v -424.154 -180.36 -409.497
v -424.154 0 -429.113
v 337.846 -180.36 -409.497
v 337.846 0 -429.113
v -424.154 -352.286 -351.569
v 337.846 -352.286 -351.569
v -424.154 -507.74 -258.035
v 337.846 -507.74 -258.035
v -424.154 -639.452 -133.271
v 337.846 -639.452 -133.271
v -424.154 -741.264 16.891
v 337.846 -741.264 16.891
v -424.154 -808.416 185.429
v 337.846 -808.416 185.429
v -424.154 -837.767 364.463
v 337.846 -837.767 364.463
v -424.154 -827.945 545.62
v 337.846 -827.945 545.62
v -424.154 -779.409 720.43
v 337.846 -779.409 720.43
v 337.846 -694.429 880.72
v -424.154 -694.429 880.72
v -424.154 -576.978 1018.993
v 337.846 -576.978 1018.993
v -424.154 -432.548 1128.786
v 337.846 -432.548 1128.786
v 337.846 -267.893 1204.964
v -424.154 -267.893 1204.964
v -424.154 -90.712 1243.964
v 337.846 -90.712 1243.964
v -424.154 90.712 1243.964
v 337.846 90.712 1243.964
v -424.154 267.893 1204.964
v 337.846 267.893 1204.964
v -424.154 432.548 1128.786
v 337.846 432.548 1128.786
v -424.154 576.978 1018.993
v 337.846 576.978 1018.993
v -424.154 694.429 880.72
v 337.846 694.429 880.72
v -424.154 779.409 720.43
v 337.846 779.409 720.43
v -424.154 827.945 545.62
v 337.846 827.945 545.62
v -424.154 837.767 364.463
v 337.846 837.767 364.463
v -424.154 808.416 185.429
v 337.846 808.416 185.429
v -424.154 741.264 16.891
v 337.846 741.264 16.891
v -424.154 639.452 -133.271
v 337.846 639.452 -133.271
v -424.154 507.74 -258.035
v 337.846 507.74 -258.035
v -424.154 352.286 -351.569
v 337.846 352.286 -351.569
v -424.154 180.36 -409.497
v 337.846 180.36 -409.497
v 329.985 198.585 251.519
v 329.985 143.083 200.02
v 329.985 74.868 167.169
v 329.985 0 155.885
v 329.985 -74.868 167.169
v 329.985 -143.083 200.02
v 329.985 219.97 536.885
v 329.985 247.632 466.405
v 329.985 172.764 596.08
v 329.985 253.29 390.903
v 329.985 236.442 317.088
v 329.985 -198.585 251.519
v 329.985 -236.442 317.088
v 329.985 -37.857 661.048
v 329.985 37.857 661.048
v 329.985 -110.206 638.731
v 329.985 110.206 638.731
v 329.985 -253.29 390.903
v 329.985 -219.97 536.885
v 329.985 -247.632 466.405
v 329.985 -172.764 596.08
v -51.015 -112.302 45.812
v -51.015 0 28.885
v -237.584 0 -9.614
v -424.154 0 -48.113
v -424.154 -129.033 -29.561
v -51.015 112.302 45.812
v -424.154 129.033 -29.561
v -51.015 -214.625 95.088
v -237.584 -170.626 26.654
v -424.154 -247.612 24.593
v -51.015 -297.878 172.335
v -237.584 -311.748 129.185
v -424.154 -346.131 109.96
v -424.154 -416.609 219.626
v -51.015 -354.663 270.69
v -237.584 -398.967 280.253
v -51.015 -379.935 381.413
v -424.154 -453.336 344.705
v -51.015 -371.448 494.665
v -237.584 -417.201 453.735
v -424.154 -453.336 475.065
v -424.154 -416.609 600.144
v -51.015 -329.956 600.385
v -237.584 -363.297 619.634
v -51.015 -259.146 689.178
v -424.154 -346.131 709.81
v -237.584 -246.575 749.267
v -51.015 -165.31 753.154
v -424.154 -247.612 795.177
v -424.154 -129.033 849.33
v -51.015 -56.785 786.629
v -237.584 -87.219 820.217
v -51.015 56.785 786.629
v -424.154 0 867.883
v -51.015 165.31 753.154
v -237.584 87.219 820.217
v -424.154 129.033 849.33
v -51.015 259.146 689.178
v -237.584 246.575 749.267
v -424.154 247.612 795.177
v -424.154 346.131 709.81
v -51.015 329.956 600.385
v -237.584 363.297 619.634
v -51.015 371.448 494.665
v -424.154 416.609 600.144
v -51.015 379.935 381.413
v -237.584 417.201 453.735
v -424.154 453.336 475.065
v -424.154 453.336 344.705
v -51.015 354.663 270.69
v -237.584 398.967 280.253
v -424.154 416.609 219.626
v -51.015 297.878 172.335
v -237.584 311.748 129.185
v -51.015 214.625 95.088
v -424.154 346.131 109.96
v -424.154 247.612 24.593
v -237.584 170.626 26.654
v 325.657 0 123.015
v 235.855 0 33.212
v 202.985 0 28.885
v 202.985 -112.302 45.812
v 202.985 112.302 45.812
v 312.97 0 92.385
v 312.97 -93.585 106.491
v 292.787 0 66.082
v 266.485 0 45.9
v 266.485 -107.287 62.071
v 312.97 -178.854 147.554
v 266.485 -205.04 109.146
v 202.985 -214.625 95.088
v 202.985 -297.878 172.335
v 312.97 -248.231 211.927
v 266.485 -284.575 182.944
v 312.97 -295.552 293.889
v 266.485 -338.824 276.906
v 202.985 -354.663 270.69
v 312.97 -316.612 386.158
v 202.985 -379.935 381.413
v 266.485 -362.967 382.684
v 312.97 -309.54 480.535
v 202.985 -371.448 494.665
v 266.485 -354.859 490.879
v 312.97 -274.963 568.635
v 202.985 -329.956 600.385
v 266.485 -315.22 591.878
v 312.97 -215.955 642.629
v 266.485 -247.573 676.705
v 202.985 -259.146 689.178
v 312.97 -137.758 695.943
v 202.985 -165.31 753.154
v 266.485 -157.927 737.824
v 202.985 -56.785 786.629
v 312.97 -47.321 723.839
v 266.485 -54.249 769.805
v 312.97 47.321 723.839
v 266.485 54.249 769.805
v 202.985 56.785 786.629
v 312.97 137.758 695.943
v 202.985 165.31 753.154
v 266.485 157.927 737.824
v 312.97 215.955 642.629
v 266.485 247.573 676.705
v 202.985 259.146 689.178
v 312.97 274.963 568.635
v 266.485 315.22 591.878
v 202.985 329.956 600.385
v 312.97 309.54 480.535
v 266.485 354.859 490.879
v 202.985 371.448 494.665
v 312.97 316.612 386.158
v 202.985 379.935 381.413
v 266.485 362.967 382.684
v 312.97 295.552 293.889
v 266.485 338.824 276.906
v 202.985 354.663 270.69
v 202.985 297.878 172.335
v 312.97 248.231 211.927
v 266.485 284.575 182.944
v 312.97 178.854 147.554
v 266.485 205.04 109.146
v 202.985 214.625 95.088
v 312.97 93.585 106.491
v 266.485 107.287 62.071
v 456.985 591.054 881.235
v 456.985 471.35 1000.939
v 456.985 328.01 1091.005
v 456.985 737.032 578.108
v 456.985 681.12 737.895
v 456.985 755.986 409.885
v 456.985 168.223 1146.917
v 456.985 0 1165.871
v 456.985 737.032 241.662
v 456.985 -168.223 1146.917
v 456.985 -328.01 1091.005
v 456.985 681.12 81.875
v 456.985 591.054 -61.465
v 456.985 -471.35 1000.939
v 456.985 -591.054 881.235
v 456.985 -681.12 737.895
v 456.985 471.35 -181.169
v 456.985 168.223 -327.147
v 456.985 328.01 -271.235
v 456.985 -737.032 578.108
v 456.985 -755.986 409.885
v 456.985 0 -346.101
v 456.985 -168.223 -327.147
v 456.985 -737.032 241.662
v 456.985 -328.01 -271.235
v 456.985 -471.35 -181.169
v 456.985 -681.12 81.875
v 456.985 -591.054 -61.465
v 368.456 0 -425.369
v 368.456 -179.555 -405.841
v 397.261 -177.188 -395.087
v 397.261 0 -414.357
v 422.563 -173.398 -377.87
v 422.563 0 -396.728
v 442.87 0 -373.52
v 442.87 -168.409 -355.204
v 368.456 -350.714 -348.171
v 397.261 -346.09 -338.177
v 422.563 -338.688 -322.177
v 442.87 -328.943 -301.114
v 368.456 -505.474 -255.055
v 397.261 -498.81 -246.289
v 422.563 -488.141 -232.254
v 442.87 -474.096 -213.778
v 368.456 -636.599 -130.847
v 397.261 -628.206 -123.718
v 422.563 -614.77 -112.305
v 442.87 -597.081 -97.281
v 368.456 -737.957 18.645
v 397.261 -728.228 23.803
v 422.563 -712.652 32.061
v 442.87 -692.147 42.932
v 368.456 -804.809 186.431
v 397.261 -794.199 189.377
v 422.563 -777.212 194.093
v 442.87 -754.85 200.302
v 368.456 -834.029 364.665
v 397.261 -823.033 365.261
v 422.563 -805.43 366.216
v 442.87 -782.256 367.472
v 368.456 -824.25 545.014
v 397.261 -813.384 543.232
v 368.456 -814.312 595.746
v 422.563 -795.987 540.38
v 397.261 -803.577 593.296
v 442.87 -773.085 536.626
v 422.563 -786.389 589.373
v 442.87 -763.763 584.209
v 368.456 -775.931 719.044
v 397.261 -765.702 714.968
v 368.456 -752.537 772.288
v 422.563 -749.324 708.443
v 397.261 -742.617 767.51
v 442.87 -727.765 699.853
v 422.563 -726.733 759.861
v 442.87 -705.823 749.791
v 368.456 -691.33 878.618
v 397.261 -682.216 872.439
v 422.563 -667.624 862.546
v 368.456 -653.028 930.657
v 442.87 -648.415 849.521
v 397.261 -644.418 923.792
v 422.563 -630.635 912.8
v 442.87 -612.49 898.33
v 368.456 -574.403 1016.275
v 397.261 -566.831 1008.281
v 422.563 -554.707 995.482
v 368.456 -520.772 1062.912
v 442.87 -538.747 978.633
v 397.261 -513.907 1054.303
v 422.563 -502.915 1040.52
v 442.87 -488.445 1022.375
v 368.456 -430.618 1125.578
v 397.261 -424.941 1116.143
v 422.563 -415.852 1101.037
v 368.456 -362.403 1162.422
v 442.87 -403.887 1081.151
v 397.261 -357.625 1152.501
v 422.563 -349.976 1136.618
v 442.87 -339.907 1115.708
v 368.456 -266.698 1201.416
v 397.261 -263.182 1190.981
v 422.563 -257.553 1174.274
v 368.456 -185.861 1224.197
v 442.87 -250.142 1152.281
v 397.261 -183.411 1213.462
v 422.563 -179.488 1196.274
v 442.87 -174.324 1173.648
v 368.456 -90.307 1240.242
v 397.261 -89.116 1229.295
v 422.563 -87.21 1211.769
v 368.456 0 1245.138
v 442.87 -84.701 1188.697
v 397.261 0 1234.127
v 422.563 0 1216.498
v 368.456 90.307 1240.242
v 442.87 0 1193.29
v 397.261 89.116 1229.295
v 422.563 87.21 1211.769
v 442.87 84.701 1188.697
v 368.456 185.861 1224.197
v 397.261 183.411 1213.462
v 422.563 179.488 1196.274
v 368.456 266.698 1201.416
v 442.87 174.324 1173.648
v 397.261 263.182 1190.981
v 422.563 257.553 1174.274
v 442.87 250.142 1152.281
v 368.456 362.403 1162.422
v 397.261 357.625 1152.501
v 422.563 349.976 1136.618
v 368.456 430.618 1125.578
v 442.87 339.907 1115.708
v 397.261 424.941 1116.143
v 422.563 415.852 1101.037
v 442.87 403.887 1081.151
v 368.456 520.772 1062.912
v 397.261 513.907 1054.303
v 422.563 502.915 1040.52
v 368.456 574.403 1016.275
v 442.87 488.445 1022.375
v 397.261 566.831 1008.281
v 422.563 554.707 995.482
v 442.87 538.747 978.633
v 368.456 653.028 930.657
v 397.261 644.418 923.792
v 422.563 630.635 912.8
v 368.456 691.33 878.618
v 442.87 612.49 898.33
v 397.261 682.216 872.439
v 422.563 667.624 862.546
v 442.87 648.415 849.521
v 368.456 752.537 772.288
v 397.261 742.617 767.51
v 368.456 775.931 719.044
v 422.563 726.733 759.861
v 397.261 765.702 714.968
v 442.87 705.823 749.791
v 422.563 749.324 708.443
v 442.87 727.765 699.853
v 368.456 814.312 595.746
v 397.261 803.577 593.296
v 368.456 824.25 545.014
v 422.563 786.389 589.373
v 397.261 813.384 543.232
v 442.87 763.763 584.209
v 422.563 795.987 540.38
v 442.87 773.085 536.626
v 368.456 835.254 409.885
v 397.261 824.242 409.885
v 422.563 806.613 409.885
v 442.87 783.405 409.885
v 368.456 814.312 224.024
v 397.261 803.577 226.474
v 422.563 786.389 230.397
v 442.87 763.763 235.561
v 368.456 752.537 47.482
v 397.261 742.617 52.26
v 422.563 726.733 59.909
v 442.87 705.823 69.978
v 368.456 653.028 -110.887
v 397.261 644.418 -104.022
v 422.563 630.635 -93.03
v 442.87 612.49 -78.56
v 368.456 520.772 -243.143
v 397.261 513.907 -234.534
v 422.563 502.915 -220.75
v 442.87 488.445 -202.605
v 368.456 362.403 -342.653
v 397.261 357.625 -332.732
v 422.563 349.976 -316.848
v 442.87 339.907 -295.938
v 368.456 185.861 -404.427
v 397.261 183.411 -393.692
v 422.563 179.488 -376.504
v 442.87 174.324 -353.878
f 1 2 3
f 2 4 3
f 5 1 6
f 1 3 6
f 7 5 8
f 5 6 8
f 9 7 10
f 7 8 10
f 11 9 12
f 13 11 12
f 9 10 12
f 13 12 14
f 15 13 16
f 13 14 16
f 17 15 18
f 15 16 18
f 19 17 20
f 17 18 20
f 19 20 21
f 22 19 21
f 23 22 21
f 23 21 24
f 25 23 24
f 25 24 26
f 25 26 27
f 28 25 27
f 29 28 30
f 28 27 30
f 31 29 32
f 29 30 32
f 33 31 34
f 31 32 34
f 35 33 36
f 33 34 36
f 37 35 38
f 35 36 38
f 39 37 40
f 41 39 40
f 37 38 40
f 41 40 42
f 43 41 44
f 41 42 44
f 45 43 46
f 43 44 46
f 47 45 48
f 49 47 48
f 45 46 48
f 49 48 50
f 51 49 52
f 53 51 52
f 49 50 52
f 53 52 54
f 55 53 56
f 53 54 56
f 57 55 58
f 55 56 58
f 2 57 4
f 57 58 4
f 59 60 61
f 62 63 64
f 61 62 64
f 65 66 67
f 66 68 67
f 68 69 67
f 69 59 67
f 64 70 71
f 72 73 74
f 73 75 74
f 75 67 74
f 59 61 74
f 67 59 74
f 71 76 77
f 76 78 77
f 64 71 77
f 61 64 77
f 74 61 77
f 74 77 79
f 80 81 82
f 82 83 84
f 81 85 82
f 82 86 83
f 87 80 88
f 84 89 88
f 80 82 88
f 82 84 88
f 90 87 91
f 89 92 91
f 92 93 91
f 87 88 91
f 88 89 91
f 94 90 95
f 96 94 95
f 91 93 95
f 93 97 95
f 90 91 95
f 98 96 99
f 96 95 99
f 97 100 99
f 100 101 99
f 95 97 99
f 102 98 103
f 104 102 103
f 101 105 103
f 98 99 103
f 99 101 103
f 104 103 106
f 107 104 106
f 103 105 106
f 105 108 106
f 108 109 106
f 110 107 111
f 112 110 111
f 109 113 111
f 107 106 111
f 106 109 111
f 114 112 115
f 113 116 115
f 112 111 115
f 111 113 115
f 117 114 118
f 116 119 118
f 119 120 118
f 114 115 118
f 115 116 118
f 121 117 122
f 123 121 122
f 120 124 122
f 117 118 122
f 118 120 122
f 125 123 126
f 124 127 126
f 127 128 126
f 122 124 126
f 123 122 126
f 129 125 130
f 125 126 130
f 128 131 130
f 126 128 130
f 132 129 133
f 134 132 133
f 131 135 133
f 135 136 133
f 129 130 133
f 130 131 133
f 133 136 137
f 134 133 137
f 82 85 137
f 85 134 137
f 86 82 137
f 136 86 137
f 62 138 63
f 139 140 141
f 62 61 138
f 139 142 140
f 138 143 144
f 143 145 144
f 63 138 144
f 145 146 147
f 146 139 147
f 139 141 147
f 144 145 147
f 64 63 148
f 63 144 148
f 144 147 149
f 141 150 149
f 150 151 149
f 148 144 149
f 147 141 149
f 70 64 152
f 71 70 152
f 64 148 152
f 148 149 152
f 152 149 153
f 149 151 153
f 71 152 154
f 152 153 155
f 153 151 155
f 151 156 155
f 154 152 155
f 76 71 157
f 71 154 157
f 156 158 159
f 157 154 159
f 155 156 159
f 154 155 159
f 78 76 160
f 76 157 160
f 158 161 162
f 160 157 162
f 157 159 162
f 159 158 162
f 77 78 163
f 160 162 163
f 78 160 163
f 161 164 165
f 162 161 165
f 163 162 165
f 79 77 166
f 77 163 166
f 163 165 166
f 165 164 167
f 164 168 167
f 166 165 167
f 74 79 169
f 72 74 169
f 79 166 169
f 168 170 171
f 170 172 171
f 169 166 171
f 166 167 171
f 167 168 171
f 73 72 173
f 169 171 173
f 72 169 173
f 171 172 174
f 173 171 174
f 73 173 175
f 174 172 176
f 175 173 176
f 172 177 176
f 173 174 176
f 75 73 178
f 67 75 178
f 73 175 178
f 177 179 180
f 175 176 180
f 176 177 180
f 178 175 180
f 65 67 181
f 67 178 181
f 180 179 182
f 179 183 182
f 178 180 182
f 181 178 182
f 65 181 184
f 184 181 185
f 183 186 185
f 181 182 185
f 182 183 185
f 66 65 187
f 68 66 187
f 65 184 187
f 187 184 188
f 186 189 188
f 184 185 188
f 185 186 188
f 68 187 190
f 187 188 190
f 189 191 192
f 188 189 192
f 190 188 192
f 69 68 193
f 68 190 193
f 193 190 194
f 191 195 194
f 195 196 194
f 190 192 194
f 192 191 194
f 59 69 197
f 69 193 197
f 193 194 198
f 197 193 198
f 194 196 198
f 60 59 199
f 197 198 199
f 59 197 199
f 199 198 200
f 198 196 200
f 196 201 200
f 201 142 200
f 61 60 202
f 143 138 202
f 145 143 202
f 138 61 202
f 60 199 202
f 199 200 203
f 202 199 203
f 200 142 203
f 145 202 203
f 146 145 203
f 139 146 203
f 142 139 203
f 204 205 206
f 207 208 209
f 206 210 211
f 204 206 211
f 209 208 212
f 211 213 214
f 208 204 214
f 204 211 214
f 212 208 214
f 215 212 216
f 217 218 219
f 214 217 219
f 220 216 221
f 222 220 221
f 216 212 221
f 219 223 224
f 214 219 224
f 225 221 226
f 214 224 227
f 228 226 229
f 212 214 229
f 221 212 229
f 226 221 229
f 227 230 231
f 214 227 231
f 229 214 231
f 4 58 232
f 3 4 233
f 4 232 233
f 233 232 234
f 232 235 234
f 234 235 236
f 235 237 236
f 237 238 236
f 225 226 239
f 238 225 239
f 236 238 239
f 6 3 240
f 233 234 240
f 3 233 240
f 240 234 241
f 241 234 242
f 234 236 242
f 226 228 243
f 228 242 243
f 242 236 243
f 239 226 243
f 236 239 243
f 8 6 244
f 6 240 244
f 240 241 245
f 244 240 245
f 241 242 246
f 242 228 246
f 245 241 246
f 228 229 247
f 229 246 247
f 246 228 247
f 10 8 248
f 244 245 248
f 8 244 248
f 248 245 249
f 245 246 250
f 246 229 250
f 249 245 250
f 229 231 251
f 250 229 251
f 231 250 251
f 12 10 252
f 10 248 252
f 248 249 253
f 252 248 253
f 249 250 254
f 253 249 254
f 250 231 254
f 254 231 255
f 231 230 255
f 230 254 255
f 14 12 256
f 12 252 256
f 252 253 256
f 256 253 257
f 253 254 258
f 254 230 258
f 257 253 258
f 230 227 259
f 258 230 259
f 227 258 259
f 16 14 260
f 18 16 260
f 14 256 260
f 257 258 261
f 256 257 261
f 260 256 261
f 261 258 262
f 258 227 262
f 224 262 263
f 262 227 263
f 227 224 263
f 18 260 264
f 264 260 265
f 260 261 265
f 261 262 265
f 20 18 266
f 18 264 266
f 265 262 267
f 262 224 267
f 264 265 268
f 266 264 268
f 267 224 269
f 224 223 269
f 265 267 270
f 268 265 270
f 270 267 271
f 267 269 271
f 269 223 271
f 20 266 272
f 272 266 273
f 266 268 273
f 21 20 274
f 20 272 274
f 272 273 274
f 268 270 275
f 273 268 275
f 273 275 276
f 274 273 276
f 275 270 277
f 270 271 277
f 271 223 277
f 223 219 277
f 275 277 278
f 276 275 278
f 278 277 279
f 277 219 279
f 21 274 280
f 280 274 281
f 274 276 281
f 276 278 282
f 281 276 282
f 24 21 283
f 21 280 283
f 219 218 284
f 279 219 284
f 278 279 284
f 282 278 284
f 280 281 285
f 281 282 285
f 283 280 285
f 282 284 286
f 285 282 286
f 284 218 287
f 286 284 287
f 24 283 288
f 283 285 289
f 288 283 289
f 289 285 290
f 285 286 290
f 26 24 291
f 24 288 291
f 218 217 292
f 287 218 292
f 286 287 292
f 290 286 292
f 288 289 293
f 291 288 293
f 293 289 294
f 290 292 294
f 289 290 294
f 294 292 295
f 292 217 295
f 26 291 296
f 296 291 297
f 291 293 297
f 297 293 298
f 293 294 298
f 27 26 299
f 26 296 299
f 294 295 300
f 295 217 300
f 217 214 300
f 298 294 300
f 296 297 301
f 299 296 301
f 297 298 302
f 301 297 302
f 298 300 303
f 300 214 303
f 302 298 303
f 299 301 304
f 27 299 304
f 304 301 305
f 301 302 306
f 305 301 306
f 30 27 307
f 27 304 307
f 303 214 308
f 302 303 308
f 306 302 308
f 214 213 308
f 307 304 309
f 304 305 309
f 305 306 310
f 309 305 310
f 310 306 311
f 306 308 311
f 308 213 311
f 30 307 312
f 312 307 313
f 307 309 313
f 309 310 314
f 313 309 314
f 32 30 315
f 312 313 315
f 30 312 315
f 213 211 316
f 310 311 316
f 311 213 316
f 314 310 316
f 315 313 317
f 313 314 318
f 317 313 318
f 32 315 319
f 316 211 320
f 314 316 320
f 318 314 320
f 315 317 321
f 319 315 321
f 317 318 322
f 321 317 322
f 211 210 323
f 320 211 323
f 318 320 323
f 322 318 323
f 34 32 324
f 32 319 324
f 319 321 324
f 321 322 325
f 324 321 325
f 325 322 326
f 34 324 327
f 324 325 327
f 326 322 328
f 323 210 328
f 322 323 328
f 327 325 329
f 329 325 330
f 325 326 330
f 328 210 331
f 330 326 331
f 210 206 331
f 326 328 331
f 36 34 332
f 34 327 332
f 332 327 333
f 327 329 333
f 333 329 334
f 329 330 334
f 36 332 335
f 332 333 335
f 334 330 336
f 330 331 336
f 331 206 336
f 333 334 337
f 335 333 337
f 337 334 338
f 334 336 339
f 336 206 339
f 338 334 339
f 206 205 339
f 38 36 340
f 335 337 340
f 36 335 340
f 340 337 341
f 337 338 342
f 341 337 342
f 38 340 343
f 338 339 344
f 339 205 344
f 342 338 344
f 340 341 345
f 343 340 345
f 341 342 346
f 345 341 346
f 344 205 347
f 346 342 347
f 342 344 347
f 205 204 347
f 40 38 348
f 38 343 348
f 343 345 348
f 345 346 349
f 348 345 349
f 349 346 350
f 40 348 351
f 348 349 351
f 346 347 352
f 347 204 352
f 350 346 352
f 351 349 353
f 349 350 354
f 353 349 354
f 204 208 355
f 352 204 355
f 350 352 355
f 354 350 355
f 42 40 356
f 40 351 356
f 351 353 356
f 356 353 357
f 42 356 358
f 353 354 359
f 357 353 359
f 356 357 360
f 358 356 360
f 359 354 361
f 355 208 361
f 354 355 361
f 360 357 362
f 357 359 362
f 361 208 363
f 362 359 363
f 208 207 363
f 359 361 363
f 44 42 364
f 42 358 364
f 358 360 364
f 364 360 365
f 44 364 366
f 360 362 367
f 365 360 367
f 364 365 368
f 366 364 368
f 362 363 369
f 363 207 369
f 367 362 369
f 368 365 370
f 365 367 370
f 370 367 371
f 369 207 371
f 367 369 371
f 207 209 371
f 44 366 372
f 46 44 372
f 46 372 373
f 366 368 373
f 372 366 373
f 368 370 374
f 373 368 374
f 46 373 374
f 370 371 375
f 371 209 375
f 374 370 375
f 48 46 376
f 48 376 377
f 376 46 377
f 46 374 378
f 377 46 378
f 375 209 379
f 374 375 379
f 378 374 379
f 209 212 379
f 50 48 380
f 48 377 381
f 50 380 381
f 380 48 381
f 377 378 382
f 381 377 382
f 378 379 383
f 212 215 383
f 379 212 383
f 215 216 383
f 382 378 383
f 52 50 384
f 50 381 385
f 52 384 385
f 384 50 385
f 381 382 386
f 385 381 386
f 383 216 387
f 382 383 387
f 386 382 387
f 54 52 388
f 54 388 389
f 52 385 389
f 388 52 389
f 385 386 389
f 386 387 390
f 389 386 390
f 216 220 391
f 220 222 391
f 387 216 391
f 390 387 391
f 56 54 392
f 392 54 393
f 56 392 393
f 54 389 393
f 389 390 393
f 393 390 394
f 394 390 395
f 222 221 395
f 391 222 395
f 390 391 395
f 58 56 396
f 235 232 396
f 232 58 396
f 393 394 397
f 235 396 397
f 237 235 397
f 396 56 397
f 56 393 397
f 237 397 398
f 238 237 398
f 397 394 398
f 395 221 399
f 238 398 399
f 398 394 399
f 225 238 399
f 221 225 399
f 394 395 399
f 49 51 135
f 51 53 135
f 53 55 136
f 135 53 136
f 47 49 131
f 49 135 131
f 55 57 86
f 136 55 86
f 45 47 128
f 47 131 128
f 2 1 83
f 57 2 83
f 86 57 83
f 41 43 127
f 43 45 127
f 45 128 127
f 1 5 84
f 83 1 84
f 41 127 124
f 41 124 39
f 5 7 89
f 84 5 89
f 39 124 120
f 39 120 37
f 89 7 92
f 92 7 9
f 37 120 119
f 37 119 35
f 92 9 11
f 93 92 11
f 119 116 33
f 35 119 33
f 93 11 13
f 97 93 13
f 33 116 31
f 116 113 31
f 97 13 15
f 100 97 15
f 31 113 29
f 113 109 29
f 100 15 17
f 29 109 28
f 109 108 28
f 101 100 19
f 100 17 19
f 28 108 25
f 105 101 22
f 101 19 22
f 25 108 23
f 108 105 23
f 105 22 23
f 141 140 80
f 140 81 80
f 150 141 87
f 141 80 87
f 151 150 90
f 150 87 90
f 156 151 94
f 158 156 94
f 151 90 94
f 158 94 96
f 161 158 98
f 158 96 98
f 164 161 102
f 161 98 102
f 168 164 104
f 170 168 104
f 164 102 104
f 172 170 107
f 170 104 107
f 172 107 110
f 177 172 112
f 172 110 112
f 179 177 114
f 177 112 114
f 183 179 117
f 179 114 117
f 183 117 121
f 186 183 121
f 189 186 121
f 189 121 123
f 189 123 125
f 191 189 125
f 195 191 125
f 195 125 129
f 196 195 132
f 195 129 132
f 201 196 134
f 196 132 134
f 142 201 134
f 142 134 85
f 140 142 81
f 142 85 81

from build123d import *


with BuildPart() as f1:
    # F0 (on Front) → F1 (revolve)
    with BuildSketch(Plane.XZ):
        with BuildLine():
            Line((-51.01523, 28.884935), (-424.153769, -48.112668))
            Line((-424.153769, -48.112668), (-424.153769, -429.112668))
            Line((-424.153769, -429.112668), (337.846231, -429.112668))
            ThreePointArc((337.846231, -429.112668), (410.449368, -406.313361), (456.98477, -346.1014))
            Line((456.98477, -346.1014), (456.98477, 409.884935))
            Line((456.98477, 409.884935), (329.98477, 409.884935))
            Line((329.98477, 409.884935), (329.98477, 155.884935))
            ThreePointArc((329.98477, 155.884935), (292.787331, 66.082374), (202.98477, 28.884935))
            Line((202.98477, 28.884935), (-51.01523, 28.884935))
        make_face()
    revolve(axis=Axis((393.48477, 0, 409.884935), (-1, 0, 0)))


solid = f1.part
